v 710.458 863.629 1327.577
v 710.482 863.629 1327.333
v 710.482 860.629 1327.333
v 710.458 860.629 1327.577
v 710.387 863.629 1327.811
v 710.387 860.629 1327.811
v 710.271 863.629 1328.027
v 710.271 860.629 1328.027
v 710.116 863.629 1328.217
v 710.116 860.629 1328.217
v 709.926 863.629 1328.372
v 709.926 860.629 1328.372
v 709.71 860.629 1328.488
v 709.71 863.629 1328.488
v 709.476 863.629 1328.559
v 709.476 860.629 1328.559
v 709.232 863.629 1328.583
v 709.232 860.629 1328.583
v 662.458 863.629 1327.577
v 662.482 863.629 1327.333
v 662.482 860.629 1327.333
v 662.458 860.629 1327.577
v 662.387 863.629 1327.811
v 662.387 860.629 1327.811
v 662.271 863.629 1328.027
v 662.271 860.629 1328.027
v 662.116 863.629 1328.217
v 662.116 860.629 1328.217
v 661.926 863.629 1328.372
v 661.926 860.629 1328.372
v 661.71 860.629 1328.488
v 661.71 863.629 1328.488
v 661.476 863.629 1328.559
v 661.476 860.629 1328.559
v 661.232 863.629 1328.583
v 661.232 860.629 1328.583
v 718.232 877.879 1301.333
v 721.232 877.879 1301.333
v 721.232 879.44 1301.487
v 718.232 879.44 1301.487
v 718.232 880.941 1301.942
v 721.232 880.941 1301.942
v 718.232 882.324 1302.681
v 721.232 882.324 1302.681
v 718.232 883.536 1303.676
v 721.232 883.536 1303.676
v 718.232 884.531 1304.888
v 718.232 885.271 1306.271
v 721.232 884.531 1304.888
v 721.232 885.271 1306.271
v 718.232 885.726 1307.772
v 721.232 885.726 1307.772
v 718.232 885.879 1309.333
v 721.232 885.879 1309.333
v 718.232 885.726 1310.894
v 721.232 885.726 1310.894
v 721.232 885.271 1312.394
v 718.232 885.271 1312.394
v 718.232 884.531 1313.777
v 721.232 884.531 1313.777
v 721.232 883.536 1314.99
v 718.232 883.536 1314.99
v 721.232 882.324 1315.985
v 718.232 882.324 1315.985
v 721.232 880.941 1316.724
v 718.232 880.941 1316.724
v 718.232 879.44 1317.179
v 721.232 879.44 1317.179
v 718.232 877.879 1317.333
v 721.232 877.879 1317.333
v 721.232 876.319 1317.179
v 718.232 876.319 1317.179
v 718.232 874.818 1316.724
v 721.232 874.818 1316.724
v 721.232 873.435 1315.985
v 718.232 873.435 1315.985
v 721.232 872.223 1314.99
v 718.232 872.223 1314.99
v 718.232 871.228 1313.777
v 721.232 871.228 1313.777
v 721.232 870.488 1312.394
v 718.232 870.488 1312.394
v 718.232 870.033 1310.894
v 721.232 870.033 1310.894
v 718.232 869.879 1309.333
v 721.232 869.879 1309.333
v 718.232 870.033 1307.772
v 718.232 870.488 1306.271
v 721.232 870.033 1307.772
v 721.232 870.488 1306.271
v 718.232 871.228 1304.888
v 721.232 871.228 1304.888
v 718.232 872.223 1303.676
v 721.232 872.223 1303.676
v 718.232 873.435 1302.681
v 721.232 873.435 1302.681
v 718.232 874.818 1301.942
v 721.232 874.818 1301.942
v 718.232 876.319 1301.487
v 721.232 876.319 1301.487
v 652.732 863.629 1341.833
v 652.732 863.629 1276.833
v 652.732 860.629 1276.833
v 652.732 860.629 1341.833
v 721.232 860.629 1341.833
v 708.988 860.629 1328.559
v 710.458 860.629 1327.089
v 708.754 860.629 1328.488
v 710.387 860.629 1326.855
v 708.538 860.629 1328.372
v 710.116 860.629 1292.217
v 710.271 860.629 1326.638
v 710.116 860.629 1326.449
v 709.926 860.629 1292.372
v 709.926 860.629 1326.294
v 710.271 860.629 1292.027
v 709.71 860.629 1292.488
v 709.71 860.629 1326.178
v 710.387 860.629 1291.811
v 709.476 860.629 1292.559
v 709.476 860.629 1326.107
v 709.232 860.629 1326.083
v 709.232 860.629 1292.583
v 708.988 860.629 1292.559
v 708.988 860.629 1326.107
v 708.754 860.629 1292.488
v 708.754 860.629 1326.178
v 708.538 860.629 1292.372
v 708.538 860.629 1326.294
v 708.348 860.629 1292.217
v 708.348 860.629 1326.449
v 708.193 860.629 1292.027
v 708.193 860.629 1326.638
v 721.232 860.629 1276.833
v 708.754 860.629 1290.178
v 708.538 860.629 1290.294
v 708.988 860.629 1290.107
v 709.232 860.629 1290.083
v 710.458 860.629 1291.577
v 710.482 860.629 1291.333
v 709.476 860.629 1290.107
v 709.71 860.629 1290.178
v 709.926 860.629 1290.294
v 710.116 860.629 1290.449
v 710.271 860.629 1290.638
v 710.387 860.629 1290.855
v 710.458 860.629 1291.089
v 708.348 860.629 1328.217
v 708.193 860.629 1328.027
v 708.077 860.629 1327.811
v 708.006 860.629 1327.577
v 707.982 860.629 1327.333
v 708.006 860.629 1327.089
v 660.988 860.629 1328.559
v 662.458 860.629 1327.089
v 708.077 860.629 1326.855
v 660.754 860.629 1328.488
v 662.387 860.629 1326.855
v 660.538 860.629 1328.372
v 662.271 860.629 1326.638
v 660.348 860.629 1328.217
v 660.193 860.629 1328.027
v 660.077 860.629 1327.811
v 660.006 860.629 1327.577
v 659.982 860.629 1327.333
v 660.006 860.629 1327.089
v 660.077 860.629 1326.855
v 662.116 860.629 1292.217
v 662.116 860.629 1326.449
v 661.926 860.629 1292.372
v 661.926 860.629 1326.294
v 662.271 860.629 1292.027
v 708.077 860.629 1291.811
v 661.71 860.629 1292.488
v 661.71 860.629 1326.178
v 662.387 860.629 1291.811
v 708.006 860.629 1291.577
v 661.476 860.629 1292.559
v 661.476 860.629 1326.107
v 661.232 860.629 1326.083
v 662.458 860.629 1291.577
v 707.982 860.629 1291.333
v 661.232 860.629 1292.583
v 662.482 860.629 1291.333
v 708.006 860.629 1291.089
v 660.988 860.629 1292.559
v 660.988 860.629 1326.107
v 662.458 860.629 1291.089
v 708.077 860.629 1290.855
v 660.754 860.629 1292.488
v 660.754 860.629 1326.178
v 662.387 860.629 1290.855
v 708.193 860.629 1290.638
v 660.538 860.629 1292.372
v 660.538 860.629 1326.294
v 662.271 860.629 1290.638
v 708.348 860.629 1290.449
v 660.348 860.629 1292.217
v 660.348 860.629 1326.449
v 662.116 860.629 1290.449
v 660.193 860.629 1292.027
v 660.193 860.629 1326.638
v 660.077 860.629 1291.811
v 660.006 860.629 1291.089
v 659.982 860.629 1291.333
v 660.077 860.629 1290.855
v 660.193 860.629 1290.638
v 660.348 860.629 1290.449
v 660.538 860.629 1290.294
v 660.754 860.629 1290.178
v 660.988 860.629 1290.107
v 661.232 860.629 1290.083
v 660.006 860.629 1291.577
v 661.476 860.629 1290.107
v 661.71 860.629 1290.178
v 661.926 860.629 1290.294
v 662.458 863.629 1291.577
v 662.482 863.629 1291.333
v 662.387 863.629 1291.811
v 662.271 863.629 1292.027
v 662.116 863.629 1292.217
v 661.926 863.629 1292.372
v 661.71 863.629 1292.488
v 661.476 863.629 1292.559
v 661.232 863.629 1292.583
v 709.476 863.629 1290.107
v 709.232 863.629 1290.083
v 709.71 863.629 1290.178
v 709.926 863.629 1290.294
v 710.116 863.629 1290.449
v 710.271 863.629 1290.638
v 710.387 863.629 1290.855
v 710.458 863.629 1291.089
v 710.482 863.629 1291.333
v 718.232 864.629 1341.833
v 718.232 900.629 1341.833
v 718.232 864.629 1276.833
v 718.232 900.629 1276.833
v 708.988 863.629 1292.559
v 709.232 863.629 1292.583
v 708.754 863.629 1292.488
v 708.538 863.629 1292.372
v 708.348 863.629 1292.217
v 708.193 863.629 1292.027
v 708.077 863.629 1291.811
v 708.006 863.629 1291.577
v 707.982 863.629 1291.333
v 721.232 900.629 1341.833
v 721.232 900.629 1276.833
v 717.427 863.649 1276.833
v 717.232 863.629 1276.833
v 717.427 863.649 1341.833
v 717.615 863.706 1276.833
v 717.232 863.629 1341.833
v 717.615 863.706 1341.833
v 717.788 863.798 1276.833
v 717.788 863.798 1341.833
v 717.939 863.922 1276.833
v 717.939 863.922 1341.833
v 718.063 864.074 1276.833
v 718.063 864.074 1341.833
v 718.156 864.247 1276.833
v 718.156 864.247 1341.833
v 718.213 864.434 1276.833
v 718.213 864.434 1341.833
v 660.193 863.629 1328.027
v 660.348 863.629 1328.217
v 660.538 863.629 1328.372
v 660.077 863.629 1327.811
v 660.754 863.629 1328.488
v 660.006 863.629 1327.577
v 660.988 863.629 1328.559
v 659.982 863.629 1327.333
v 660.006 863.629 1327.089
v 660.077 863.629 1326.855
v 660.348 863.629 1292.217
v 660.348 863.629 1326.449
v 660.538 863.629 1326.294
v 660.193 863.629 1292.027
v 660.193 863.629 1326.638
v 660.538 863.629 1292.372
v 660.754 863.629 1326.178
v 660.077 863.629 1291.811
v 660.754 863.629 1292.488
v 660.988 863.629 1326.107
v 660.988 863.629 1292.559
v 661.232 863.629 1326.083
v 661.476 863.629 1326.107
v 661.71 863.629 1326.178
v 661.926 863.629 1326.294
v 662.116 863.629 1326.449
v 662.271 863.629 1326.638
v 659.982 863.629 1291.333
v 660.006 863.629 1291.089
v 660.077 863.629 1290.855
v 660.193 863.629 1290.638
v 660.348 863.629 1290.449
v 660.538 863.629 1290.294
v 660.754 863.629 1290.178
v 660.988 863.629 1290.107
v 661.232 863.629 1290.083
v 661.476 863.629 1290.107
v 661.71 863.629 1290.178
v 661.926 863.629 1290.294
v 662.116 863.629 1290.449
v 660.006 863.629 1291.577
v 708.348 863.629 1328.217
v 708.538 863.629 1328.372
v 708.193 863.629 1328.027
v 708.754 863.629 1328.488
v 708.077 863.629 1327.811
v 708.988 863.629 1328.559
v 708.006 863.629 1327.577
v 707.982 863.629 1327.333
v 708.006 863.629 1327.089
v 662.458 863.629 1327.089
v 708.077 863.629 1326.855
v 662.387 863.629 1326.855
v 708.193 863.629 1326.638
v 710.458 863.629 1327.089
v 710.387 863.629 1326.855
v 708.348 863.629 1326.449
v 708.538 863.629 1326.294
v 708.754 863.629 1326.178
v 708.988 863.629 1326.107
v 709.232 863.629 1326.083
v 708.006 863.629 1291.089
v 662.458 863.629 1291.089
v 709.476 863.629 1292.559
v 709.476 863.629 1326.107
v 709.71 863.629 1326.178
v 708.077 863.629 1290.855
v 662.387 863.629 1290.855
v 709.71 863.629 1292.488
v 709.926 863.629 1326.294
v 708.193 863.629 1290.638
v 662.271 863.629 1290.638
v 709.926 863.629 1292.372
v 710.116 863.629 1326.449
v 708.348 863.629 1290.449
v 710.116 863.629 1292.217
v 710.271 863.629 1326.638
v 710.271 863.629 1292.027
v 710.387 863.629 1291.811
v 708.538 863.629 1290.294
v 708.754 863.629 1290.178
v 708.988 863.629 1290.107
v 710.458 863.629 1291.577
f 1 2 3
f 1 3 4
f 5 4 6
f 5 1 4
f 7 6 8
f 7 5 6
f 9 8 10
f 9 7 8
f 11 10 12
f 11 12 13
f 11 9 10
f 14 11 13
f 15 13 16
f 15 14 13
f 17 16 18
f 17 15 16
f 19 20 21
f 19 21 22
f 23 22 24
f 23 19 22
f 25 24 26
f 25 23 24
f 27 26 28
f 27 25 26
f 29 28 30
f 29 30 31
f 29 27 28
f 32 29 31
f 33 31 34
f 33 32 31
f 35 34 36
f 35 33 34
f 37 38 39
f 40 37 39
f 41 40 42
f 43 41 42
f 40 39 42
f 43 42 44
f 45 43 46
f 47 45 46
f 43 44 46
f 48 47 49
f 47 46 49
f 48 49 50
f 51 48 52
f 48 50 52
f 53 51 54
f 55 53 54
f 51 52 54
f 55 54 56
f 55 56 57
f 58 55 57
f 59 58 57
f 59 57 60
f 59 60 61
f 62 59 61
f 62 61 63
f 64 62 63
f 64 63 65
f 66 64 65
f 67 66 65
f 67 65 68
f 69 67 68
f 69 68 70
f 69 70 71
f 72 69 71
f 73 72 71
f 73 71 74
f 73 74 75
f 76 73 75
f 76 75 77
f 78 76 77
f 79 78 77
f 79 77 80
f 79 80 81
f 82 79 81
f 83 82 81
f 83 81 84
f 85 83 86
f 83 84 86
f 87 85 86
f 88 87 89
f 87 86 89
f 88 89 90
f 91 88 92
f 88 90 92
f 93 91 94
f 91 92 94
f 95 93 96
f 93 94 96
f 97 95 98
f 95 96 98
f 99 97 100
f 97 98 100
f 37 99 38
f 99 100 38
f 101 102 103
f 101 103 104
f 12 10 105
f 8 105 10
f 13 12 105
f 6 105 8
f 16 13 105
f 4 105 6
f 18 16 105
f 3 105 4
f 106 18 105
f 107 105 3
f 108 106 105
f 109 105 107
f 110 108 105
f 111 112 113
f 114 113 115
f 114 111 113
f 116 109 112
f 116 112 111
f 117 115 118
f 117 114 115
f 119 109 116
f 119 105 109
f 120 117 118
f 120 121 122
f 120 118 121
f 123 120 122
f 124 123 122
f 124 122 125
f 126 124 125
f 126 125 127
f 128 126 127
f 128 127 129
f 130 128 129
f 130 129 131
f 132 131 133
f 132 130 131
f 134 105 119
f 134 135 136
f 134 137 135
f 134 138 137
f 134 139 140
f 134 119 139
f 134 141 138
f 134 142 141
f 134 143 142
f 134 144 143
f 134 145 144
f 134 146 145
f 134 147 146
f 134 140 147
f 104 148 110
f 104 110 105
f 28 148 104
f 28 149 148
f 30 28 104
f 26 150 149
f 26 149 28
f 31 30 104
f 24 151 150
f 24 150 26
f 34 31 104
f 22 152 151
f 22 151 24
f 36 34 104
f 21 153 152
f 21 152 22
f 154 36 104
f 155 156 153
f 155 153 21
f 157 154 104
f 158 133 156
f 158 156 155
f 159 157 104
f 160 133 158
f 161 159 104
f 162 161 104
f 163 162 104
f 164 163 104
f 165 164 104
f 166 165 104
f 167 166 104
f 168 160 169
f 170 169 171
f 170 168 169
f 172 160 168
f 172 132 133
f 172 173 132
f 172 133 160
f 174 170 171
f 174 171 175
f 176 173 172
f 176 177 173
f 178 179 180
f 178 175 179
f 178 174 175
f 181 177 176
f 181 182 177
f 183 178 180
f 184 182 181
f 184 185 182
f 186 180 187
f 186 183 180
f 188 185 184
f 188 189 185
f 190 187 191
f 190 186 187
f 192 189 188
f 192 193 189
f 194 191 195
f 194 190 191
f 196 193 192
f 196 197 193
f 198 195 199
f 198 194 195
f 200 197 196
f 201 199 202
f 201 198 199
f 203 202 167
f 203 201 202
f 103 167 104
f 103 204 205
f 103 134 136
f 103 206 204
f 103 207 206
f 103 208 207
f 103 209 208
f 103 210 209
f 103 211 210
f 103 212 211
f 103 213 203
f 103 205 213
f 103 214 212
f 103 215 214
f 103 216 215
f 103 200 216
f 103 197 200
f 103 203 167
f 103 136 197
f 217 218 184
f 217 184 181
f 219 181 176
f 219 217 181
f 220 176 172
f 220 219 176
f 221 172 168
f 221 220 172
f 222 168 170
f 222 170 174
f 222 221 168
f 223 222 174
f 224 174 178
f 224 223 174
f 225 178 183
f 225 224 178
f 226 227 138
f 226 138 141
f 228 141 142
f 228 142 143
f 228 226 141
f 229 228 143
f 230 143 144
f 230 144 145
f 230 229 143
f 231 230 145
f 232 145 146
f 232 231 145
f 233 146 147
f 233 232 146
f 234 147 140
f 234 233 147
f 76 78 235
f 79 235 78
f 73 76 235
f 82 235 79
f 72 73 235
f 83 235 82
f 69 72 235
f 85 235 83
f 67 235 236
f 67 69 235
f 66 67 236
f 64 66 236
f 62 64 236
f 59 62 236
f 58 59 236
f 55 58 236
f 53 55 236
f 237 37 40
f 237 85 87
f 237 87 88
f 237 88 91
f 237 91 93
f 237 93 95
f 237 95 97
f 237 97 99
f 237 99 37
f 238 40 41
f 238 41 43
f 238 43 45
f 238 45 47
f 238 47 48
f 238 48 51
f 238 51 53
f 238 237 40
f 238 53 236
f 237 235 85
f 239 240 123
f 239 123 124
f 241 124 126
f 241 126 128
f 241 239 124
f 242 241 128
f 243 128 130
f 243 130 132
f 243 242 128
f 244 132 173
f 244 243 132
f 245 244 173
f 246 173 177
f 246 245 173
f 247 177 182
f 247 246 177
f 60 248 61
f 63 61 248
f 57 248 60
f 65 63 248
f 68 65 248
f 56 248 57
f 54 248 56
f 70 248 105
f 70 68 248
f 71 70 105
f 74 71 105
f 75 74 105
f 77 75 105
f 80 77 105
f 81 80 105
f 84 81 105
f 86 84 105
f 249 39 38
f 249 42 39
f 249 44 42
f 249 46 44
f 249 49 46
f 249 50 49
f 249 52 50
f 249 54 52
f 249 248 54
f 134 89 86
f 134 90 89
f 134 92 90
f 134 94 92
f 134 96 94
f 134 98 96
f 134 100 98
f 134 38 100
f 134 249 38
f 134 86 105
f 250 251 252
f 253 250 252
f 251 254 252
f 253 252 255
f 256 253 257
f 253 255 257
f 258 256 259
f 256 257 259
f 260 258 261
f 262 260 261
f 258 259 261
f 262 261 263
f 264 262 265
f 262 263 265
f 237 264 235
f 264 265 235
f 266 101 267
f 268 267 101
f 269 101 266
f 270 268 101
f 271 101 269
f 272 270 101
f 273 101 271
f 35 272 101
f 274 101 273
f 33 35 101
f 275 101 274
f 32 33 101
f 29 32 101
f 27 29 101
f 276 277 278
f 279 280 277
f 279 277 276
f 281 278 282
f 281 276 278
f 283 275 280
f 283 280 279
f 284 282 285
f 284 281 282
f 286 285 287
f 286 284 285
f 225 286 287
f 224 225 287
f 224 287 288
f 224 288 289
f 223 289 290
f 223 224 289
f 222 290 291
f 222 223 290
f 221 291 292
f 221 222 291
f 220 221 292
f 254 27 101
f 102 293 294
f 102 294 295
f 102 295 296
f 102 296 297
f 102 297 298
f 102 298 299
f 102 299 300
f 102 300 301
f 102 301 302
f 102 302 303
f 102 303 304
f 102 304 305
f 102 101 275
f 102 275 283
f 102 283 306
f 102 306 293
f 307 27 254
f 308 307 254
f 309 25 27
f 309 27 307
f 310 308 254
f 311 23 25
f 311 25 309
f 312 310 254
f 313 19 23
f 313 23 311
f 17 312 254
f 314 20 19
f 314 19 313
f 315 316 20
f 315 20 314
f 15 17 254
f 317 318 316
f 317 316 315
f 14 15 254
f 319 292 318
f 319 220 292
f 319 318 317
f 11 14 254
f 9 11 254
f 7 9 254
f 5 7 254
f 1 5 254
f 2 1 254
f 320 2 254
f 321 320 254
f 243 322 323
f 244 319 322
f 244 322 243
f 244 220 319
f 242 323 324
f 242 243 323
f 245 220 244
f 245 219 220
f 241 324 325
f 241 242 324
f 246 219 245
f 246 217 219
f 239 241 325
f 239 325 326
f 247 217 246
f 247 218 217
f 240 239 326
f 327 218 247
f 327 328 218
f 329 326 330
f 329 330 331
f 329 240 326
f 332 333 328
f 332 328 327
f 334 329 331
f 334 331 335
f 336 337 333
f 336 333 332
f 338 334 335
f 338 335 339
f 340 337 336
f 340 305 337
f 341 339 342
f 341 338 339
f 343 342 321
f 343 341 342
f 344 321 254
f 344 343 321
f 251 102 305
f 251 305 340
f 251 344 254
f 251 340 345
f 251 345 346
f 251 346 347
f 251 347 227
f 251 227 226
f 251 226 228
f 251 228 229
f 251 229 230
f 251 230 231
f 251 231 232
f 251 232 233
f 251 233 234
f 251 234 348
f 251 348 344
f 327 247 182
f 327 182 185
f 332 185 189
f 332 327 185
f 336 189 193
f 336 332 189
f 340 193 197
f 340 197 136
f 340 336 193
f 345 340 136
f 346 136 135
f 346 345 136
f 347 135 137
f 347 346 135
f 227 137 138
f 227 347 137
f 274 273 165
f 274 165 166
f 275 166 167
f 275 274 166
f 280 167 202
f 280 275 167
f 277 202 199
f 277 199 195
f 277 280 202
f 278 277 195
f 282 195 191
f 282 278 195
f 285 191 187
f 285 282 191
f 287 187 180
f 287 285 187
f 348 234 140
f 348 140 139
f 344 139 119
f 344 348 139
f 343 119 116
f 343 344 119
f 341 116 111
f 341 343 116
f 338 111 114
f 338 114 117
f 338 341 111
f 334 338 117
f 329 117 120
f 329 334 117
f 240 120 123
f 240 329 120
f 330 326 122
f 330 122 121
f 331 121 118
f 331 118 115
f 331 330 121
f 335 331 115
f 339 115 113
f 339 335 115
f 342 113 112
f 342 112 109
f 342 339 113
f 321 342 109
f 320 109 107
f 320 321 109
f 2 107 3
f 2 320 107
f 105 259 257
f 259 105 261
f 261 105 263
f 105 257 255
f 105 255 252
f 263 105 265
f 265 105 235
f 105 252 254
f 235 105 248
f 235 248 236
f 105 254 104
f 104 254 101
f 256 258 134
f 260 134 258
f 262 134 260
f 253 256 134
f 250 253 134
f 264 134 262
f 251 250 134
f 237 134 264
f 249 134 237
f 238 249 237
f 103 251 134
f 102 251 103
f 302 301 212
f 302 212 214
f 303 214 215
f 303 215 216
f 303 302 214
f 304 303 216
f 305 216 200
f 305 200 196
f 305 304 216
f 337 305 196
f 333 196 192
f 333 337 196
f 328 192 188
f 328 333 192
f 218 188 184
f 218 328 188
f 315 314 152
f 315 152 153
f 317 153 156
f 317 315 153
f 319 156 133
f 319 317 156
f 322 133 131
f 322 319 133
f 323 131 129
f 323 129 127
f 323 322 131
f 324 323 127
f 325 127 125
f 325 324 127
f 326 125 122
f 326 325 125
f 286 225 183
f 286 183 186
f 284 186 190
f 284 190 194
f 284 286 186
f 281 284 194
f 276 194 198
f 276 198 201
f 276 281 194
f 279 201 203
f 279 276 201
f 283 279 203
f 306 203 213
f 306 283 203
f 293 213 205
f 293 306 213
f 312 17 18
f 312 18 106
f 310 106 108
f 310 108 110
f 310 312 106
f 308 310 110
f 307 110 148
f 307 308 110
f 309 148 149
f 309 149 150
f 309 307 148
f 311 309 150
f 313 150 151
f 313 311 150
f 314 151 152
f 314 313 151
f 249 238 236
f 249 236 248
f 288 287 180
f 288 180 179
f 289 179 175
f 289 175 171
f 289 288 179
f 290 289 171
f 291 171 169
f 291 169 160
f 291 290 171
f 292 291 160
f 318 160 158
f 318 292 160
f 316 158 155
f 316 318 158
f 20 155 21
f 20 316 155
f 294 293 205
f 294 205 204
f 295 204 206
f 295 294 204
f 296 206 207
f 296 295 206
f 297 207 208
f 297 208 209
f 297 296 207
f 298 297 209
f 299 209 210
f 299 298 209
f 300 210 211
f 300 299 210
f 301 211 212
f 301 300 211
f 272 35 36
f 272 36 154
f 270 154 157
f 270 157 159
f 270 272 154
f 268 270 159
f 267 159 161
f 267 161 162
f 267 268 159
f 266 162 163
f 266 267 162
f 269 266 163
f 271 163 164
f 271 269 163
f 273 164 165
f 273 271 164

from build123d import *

# Parameters (mm, degrees)
SKETCH3_W           = 65
SKETCH3_H           = 65
BOSS_EXTRUDE2_DEPTH = 3
BOSS_EXTRUDE3_DEPTH = 65
CUT_EXTRUDE1_REACH  = 1619.511
SKETCH6_R           = 8
FILLET1_R           = 1


with BuildPart() as part:
    # Sketch3 → Boss-Extrude2 (new body)
    with BuildSketch(Plane.XZ.offset(-863.629465365)):
        with Locations((685.231990878, 1309.332866284)):
            Rectangle(SKETCH3_W, SKETCH3_H)
        with BuildLine():
            ThreePointArc((659.981990878, 1327.332866288), (660.3481074, 1326.448982809), (661.231990878, 1326.082866284))
            ThreePointArc((661.231990878, 1326.082866284), (662.115874352, 1326.448982806), (662.481990878, 1327.332866278))
            ThreePointArc((662.481990878, 1327.332866278), (662.115874357, 1328.216749759), (661.231990878, 1328.582866284))
            ThreePointArc((661.231990878, 1328.582866284), (660.348107403, 1328.216749762), (659.981990878, 1327.332866288))
        make_face(mode=Mode.SUBTRACT)
        with BuildLine():
            ThreePointArc((659.981990878, 1291.332866288), (660.3481074, 1290.448982809), (661.231990878, 1290.082866284))
            ThreePointArc((661.231990878, 1290.082866284), (662.115874352, 1290.448982806), (662.481990878, 1291.332866278))
            ThreePointArc((662.481990878, 1291.332866278), (662.115874357, 1292.216749759), (661.231990878, 1292.582866284))
            ThreePointArc((661.231990878, 1292.582866284), (660.348107403, 1292.216749762), (659.981990878, 1291.332866288))
        make_face(mode=Mode.SUBTRACT)
        with BuildLine():
            ThreePointArc((707.981990878, 1291.332866288), (708.3481074, 1290.448982809), (709.231990878, 1290.082866284))
            ThreePointArc((709.231990878, 1290.082866284), (710.115874352, 1290.448982806), (710.481990878, 1291.332866278))
            ThreePointArc((710.481990878, 1291.332866278), (710.115874357, 1292.216749759), (709.231990878, 1292.582866284))
            ThreePointArc((709.231990878, 1292.582866284), (708.348107403, 1292.216749762), (707.981990878, 1291.332866288))
        make_face(mode=Mode.SUBTRACT)
        with BuildLine():
            ThreePointArc((707.981990878, 1327.332866284), (708.348107402, 1326.448982808), (709.231990878, 1326.082866284))
            ThreePointArc((709.231990878, 1326.082866284), (710.115874352, 1326.448982805), (710.481990878, 1327.332866277))
            ThreePointArc((710.481990878, 1327.332866277), (710.115874357, 1328.216749758), (709.231990878, 1328.582866284))
            ThreePointArc((709.231990878, 1328.582866284), (708.348107402, 1328.216749761), (707.981990878, 1327.332866284))
        make_face(mode=Mode.SUBTRACT)
    extrude(amount=BOSS_EXTRUDE2_DEPTH)

    # Sketch4 → Boss-Extrude3 (add)
    with BuildSketch(Plane(origin=(0, 0, 1276.832866284), x_dir=(-1, 0, 0), z_dir=(0, 0, -1))):
        Polygon((-717.731990878, 860.629465365), (-717.731990878, 863.629465365), (-718.231990878, 863.629465365), (-718.231990878, 900.629465365), (-721.231990878, 900.629465365), (-721.231990878, 860.629465365), align=None)
    extrude(amount=-BOSS_EXTRUDE3_DEPTH)

    # Sketch6 → Cut-Extrude1 (cut, up to next)
    with BuildSketch(Plane(origin=(721.231990878, 0, 0), x_dir=(0, 0, -1), z_dir=(1, 0, 0)), mode=Mode.PRIVATE) as cut_extrude1_sk1:
        with Locations((-1309.332866284, 877.879465365)):
            Circle(SKETCH6_R)
    cut_extrude1_tool1 = extrude(cut_extrude1_sk1.sketch, amount=-CUT_EXTRUDE1_REACH, mode=Mode.PRIVATE) & part.part
    add(cut_extrude1_tool1.solids().sort_by_distance((721.231991, 877.879465, 1309.332866))[0], mode=Mode.SUBTRACT)

    # Fillet1
    fillet1_edges = [part.edges().sort_by_distance(p)[0] for p in [
        (718.231990878, 863.629465365, 1309.332866284),
    ]]
    fillet(fillet1_edges, radius=FILLET1_R)


solid = part.part
